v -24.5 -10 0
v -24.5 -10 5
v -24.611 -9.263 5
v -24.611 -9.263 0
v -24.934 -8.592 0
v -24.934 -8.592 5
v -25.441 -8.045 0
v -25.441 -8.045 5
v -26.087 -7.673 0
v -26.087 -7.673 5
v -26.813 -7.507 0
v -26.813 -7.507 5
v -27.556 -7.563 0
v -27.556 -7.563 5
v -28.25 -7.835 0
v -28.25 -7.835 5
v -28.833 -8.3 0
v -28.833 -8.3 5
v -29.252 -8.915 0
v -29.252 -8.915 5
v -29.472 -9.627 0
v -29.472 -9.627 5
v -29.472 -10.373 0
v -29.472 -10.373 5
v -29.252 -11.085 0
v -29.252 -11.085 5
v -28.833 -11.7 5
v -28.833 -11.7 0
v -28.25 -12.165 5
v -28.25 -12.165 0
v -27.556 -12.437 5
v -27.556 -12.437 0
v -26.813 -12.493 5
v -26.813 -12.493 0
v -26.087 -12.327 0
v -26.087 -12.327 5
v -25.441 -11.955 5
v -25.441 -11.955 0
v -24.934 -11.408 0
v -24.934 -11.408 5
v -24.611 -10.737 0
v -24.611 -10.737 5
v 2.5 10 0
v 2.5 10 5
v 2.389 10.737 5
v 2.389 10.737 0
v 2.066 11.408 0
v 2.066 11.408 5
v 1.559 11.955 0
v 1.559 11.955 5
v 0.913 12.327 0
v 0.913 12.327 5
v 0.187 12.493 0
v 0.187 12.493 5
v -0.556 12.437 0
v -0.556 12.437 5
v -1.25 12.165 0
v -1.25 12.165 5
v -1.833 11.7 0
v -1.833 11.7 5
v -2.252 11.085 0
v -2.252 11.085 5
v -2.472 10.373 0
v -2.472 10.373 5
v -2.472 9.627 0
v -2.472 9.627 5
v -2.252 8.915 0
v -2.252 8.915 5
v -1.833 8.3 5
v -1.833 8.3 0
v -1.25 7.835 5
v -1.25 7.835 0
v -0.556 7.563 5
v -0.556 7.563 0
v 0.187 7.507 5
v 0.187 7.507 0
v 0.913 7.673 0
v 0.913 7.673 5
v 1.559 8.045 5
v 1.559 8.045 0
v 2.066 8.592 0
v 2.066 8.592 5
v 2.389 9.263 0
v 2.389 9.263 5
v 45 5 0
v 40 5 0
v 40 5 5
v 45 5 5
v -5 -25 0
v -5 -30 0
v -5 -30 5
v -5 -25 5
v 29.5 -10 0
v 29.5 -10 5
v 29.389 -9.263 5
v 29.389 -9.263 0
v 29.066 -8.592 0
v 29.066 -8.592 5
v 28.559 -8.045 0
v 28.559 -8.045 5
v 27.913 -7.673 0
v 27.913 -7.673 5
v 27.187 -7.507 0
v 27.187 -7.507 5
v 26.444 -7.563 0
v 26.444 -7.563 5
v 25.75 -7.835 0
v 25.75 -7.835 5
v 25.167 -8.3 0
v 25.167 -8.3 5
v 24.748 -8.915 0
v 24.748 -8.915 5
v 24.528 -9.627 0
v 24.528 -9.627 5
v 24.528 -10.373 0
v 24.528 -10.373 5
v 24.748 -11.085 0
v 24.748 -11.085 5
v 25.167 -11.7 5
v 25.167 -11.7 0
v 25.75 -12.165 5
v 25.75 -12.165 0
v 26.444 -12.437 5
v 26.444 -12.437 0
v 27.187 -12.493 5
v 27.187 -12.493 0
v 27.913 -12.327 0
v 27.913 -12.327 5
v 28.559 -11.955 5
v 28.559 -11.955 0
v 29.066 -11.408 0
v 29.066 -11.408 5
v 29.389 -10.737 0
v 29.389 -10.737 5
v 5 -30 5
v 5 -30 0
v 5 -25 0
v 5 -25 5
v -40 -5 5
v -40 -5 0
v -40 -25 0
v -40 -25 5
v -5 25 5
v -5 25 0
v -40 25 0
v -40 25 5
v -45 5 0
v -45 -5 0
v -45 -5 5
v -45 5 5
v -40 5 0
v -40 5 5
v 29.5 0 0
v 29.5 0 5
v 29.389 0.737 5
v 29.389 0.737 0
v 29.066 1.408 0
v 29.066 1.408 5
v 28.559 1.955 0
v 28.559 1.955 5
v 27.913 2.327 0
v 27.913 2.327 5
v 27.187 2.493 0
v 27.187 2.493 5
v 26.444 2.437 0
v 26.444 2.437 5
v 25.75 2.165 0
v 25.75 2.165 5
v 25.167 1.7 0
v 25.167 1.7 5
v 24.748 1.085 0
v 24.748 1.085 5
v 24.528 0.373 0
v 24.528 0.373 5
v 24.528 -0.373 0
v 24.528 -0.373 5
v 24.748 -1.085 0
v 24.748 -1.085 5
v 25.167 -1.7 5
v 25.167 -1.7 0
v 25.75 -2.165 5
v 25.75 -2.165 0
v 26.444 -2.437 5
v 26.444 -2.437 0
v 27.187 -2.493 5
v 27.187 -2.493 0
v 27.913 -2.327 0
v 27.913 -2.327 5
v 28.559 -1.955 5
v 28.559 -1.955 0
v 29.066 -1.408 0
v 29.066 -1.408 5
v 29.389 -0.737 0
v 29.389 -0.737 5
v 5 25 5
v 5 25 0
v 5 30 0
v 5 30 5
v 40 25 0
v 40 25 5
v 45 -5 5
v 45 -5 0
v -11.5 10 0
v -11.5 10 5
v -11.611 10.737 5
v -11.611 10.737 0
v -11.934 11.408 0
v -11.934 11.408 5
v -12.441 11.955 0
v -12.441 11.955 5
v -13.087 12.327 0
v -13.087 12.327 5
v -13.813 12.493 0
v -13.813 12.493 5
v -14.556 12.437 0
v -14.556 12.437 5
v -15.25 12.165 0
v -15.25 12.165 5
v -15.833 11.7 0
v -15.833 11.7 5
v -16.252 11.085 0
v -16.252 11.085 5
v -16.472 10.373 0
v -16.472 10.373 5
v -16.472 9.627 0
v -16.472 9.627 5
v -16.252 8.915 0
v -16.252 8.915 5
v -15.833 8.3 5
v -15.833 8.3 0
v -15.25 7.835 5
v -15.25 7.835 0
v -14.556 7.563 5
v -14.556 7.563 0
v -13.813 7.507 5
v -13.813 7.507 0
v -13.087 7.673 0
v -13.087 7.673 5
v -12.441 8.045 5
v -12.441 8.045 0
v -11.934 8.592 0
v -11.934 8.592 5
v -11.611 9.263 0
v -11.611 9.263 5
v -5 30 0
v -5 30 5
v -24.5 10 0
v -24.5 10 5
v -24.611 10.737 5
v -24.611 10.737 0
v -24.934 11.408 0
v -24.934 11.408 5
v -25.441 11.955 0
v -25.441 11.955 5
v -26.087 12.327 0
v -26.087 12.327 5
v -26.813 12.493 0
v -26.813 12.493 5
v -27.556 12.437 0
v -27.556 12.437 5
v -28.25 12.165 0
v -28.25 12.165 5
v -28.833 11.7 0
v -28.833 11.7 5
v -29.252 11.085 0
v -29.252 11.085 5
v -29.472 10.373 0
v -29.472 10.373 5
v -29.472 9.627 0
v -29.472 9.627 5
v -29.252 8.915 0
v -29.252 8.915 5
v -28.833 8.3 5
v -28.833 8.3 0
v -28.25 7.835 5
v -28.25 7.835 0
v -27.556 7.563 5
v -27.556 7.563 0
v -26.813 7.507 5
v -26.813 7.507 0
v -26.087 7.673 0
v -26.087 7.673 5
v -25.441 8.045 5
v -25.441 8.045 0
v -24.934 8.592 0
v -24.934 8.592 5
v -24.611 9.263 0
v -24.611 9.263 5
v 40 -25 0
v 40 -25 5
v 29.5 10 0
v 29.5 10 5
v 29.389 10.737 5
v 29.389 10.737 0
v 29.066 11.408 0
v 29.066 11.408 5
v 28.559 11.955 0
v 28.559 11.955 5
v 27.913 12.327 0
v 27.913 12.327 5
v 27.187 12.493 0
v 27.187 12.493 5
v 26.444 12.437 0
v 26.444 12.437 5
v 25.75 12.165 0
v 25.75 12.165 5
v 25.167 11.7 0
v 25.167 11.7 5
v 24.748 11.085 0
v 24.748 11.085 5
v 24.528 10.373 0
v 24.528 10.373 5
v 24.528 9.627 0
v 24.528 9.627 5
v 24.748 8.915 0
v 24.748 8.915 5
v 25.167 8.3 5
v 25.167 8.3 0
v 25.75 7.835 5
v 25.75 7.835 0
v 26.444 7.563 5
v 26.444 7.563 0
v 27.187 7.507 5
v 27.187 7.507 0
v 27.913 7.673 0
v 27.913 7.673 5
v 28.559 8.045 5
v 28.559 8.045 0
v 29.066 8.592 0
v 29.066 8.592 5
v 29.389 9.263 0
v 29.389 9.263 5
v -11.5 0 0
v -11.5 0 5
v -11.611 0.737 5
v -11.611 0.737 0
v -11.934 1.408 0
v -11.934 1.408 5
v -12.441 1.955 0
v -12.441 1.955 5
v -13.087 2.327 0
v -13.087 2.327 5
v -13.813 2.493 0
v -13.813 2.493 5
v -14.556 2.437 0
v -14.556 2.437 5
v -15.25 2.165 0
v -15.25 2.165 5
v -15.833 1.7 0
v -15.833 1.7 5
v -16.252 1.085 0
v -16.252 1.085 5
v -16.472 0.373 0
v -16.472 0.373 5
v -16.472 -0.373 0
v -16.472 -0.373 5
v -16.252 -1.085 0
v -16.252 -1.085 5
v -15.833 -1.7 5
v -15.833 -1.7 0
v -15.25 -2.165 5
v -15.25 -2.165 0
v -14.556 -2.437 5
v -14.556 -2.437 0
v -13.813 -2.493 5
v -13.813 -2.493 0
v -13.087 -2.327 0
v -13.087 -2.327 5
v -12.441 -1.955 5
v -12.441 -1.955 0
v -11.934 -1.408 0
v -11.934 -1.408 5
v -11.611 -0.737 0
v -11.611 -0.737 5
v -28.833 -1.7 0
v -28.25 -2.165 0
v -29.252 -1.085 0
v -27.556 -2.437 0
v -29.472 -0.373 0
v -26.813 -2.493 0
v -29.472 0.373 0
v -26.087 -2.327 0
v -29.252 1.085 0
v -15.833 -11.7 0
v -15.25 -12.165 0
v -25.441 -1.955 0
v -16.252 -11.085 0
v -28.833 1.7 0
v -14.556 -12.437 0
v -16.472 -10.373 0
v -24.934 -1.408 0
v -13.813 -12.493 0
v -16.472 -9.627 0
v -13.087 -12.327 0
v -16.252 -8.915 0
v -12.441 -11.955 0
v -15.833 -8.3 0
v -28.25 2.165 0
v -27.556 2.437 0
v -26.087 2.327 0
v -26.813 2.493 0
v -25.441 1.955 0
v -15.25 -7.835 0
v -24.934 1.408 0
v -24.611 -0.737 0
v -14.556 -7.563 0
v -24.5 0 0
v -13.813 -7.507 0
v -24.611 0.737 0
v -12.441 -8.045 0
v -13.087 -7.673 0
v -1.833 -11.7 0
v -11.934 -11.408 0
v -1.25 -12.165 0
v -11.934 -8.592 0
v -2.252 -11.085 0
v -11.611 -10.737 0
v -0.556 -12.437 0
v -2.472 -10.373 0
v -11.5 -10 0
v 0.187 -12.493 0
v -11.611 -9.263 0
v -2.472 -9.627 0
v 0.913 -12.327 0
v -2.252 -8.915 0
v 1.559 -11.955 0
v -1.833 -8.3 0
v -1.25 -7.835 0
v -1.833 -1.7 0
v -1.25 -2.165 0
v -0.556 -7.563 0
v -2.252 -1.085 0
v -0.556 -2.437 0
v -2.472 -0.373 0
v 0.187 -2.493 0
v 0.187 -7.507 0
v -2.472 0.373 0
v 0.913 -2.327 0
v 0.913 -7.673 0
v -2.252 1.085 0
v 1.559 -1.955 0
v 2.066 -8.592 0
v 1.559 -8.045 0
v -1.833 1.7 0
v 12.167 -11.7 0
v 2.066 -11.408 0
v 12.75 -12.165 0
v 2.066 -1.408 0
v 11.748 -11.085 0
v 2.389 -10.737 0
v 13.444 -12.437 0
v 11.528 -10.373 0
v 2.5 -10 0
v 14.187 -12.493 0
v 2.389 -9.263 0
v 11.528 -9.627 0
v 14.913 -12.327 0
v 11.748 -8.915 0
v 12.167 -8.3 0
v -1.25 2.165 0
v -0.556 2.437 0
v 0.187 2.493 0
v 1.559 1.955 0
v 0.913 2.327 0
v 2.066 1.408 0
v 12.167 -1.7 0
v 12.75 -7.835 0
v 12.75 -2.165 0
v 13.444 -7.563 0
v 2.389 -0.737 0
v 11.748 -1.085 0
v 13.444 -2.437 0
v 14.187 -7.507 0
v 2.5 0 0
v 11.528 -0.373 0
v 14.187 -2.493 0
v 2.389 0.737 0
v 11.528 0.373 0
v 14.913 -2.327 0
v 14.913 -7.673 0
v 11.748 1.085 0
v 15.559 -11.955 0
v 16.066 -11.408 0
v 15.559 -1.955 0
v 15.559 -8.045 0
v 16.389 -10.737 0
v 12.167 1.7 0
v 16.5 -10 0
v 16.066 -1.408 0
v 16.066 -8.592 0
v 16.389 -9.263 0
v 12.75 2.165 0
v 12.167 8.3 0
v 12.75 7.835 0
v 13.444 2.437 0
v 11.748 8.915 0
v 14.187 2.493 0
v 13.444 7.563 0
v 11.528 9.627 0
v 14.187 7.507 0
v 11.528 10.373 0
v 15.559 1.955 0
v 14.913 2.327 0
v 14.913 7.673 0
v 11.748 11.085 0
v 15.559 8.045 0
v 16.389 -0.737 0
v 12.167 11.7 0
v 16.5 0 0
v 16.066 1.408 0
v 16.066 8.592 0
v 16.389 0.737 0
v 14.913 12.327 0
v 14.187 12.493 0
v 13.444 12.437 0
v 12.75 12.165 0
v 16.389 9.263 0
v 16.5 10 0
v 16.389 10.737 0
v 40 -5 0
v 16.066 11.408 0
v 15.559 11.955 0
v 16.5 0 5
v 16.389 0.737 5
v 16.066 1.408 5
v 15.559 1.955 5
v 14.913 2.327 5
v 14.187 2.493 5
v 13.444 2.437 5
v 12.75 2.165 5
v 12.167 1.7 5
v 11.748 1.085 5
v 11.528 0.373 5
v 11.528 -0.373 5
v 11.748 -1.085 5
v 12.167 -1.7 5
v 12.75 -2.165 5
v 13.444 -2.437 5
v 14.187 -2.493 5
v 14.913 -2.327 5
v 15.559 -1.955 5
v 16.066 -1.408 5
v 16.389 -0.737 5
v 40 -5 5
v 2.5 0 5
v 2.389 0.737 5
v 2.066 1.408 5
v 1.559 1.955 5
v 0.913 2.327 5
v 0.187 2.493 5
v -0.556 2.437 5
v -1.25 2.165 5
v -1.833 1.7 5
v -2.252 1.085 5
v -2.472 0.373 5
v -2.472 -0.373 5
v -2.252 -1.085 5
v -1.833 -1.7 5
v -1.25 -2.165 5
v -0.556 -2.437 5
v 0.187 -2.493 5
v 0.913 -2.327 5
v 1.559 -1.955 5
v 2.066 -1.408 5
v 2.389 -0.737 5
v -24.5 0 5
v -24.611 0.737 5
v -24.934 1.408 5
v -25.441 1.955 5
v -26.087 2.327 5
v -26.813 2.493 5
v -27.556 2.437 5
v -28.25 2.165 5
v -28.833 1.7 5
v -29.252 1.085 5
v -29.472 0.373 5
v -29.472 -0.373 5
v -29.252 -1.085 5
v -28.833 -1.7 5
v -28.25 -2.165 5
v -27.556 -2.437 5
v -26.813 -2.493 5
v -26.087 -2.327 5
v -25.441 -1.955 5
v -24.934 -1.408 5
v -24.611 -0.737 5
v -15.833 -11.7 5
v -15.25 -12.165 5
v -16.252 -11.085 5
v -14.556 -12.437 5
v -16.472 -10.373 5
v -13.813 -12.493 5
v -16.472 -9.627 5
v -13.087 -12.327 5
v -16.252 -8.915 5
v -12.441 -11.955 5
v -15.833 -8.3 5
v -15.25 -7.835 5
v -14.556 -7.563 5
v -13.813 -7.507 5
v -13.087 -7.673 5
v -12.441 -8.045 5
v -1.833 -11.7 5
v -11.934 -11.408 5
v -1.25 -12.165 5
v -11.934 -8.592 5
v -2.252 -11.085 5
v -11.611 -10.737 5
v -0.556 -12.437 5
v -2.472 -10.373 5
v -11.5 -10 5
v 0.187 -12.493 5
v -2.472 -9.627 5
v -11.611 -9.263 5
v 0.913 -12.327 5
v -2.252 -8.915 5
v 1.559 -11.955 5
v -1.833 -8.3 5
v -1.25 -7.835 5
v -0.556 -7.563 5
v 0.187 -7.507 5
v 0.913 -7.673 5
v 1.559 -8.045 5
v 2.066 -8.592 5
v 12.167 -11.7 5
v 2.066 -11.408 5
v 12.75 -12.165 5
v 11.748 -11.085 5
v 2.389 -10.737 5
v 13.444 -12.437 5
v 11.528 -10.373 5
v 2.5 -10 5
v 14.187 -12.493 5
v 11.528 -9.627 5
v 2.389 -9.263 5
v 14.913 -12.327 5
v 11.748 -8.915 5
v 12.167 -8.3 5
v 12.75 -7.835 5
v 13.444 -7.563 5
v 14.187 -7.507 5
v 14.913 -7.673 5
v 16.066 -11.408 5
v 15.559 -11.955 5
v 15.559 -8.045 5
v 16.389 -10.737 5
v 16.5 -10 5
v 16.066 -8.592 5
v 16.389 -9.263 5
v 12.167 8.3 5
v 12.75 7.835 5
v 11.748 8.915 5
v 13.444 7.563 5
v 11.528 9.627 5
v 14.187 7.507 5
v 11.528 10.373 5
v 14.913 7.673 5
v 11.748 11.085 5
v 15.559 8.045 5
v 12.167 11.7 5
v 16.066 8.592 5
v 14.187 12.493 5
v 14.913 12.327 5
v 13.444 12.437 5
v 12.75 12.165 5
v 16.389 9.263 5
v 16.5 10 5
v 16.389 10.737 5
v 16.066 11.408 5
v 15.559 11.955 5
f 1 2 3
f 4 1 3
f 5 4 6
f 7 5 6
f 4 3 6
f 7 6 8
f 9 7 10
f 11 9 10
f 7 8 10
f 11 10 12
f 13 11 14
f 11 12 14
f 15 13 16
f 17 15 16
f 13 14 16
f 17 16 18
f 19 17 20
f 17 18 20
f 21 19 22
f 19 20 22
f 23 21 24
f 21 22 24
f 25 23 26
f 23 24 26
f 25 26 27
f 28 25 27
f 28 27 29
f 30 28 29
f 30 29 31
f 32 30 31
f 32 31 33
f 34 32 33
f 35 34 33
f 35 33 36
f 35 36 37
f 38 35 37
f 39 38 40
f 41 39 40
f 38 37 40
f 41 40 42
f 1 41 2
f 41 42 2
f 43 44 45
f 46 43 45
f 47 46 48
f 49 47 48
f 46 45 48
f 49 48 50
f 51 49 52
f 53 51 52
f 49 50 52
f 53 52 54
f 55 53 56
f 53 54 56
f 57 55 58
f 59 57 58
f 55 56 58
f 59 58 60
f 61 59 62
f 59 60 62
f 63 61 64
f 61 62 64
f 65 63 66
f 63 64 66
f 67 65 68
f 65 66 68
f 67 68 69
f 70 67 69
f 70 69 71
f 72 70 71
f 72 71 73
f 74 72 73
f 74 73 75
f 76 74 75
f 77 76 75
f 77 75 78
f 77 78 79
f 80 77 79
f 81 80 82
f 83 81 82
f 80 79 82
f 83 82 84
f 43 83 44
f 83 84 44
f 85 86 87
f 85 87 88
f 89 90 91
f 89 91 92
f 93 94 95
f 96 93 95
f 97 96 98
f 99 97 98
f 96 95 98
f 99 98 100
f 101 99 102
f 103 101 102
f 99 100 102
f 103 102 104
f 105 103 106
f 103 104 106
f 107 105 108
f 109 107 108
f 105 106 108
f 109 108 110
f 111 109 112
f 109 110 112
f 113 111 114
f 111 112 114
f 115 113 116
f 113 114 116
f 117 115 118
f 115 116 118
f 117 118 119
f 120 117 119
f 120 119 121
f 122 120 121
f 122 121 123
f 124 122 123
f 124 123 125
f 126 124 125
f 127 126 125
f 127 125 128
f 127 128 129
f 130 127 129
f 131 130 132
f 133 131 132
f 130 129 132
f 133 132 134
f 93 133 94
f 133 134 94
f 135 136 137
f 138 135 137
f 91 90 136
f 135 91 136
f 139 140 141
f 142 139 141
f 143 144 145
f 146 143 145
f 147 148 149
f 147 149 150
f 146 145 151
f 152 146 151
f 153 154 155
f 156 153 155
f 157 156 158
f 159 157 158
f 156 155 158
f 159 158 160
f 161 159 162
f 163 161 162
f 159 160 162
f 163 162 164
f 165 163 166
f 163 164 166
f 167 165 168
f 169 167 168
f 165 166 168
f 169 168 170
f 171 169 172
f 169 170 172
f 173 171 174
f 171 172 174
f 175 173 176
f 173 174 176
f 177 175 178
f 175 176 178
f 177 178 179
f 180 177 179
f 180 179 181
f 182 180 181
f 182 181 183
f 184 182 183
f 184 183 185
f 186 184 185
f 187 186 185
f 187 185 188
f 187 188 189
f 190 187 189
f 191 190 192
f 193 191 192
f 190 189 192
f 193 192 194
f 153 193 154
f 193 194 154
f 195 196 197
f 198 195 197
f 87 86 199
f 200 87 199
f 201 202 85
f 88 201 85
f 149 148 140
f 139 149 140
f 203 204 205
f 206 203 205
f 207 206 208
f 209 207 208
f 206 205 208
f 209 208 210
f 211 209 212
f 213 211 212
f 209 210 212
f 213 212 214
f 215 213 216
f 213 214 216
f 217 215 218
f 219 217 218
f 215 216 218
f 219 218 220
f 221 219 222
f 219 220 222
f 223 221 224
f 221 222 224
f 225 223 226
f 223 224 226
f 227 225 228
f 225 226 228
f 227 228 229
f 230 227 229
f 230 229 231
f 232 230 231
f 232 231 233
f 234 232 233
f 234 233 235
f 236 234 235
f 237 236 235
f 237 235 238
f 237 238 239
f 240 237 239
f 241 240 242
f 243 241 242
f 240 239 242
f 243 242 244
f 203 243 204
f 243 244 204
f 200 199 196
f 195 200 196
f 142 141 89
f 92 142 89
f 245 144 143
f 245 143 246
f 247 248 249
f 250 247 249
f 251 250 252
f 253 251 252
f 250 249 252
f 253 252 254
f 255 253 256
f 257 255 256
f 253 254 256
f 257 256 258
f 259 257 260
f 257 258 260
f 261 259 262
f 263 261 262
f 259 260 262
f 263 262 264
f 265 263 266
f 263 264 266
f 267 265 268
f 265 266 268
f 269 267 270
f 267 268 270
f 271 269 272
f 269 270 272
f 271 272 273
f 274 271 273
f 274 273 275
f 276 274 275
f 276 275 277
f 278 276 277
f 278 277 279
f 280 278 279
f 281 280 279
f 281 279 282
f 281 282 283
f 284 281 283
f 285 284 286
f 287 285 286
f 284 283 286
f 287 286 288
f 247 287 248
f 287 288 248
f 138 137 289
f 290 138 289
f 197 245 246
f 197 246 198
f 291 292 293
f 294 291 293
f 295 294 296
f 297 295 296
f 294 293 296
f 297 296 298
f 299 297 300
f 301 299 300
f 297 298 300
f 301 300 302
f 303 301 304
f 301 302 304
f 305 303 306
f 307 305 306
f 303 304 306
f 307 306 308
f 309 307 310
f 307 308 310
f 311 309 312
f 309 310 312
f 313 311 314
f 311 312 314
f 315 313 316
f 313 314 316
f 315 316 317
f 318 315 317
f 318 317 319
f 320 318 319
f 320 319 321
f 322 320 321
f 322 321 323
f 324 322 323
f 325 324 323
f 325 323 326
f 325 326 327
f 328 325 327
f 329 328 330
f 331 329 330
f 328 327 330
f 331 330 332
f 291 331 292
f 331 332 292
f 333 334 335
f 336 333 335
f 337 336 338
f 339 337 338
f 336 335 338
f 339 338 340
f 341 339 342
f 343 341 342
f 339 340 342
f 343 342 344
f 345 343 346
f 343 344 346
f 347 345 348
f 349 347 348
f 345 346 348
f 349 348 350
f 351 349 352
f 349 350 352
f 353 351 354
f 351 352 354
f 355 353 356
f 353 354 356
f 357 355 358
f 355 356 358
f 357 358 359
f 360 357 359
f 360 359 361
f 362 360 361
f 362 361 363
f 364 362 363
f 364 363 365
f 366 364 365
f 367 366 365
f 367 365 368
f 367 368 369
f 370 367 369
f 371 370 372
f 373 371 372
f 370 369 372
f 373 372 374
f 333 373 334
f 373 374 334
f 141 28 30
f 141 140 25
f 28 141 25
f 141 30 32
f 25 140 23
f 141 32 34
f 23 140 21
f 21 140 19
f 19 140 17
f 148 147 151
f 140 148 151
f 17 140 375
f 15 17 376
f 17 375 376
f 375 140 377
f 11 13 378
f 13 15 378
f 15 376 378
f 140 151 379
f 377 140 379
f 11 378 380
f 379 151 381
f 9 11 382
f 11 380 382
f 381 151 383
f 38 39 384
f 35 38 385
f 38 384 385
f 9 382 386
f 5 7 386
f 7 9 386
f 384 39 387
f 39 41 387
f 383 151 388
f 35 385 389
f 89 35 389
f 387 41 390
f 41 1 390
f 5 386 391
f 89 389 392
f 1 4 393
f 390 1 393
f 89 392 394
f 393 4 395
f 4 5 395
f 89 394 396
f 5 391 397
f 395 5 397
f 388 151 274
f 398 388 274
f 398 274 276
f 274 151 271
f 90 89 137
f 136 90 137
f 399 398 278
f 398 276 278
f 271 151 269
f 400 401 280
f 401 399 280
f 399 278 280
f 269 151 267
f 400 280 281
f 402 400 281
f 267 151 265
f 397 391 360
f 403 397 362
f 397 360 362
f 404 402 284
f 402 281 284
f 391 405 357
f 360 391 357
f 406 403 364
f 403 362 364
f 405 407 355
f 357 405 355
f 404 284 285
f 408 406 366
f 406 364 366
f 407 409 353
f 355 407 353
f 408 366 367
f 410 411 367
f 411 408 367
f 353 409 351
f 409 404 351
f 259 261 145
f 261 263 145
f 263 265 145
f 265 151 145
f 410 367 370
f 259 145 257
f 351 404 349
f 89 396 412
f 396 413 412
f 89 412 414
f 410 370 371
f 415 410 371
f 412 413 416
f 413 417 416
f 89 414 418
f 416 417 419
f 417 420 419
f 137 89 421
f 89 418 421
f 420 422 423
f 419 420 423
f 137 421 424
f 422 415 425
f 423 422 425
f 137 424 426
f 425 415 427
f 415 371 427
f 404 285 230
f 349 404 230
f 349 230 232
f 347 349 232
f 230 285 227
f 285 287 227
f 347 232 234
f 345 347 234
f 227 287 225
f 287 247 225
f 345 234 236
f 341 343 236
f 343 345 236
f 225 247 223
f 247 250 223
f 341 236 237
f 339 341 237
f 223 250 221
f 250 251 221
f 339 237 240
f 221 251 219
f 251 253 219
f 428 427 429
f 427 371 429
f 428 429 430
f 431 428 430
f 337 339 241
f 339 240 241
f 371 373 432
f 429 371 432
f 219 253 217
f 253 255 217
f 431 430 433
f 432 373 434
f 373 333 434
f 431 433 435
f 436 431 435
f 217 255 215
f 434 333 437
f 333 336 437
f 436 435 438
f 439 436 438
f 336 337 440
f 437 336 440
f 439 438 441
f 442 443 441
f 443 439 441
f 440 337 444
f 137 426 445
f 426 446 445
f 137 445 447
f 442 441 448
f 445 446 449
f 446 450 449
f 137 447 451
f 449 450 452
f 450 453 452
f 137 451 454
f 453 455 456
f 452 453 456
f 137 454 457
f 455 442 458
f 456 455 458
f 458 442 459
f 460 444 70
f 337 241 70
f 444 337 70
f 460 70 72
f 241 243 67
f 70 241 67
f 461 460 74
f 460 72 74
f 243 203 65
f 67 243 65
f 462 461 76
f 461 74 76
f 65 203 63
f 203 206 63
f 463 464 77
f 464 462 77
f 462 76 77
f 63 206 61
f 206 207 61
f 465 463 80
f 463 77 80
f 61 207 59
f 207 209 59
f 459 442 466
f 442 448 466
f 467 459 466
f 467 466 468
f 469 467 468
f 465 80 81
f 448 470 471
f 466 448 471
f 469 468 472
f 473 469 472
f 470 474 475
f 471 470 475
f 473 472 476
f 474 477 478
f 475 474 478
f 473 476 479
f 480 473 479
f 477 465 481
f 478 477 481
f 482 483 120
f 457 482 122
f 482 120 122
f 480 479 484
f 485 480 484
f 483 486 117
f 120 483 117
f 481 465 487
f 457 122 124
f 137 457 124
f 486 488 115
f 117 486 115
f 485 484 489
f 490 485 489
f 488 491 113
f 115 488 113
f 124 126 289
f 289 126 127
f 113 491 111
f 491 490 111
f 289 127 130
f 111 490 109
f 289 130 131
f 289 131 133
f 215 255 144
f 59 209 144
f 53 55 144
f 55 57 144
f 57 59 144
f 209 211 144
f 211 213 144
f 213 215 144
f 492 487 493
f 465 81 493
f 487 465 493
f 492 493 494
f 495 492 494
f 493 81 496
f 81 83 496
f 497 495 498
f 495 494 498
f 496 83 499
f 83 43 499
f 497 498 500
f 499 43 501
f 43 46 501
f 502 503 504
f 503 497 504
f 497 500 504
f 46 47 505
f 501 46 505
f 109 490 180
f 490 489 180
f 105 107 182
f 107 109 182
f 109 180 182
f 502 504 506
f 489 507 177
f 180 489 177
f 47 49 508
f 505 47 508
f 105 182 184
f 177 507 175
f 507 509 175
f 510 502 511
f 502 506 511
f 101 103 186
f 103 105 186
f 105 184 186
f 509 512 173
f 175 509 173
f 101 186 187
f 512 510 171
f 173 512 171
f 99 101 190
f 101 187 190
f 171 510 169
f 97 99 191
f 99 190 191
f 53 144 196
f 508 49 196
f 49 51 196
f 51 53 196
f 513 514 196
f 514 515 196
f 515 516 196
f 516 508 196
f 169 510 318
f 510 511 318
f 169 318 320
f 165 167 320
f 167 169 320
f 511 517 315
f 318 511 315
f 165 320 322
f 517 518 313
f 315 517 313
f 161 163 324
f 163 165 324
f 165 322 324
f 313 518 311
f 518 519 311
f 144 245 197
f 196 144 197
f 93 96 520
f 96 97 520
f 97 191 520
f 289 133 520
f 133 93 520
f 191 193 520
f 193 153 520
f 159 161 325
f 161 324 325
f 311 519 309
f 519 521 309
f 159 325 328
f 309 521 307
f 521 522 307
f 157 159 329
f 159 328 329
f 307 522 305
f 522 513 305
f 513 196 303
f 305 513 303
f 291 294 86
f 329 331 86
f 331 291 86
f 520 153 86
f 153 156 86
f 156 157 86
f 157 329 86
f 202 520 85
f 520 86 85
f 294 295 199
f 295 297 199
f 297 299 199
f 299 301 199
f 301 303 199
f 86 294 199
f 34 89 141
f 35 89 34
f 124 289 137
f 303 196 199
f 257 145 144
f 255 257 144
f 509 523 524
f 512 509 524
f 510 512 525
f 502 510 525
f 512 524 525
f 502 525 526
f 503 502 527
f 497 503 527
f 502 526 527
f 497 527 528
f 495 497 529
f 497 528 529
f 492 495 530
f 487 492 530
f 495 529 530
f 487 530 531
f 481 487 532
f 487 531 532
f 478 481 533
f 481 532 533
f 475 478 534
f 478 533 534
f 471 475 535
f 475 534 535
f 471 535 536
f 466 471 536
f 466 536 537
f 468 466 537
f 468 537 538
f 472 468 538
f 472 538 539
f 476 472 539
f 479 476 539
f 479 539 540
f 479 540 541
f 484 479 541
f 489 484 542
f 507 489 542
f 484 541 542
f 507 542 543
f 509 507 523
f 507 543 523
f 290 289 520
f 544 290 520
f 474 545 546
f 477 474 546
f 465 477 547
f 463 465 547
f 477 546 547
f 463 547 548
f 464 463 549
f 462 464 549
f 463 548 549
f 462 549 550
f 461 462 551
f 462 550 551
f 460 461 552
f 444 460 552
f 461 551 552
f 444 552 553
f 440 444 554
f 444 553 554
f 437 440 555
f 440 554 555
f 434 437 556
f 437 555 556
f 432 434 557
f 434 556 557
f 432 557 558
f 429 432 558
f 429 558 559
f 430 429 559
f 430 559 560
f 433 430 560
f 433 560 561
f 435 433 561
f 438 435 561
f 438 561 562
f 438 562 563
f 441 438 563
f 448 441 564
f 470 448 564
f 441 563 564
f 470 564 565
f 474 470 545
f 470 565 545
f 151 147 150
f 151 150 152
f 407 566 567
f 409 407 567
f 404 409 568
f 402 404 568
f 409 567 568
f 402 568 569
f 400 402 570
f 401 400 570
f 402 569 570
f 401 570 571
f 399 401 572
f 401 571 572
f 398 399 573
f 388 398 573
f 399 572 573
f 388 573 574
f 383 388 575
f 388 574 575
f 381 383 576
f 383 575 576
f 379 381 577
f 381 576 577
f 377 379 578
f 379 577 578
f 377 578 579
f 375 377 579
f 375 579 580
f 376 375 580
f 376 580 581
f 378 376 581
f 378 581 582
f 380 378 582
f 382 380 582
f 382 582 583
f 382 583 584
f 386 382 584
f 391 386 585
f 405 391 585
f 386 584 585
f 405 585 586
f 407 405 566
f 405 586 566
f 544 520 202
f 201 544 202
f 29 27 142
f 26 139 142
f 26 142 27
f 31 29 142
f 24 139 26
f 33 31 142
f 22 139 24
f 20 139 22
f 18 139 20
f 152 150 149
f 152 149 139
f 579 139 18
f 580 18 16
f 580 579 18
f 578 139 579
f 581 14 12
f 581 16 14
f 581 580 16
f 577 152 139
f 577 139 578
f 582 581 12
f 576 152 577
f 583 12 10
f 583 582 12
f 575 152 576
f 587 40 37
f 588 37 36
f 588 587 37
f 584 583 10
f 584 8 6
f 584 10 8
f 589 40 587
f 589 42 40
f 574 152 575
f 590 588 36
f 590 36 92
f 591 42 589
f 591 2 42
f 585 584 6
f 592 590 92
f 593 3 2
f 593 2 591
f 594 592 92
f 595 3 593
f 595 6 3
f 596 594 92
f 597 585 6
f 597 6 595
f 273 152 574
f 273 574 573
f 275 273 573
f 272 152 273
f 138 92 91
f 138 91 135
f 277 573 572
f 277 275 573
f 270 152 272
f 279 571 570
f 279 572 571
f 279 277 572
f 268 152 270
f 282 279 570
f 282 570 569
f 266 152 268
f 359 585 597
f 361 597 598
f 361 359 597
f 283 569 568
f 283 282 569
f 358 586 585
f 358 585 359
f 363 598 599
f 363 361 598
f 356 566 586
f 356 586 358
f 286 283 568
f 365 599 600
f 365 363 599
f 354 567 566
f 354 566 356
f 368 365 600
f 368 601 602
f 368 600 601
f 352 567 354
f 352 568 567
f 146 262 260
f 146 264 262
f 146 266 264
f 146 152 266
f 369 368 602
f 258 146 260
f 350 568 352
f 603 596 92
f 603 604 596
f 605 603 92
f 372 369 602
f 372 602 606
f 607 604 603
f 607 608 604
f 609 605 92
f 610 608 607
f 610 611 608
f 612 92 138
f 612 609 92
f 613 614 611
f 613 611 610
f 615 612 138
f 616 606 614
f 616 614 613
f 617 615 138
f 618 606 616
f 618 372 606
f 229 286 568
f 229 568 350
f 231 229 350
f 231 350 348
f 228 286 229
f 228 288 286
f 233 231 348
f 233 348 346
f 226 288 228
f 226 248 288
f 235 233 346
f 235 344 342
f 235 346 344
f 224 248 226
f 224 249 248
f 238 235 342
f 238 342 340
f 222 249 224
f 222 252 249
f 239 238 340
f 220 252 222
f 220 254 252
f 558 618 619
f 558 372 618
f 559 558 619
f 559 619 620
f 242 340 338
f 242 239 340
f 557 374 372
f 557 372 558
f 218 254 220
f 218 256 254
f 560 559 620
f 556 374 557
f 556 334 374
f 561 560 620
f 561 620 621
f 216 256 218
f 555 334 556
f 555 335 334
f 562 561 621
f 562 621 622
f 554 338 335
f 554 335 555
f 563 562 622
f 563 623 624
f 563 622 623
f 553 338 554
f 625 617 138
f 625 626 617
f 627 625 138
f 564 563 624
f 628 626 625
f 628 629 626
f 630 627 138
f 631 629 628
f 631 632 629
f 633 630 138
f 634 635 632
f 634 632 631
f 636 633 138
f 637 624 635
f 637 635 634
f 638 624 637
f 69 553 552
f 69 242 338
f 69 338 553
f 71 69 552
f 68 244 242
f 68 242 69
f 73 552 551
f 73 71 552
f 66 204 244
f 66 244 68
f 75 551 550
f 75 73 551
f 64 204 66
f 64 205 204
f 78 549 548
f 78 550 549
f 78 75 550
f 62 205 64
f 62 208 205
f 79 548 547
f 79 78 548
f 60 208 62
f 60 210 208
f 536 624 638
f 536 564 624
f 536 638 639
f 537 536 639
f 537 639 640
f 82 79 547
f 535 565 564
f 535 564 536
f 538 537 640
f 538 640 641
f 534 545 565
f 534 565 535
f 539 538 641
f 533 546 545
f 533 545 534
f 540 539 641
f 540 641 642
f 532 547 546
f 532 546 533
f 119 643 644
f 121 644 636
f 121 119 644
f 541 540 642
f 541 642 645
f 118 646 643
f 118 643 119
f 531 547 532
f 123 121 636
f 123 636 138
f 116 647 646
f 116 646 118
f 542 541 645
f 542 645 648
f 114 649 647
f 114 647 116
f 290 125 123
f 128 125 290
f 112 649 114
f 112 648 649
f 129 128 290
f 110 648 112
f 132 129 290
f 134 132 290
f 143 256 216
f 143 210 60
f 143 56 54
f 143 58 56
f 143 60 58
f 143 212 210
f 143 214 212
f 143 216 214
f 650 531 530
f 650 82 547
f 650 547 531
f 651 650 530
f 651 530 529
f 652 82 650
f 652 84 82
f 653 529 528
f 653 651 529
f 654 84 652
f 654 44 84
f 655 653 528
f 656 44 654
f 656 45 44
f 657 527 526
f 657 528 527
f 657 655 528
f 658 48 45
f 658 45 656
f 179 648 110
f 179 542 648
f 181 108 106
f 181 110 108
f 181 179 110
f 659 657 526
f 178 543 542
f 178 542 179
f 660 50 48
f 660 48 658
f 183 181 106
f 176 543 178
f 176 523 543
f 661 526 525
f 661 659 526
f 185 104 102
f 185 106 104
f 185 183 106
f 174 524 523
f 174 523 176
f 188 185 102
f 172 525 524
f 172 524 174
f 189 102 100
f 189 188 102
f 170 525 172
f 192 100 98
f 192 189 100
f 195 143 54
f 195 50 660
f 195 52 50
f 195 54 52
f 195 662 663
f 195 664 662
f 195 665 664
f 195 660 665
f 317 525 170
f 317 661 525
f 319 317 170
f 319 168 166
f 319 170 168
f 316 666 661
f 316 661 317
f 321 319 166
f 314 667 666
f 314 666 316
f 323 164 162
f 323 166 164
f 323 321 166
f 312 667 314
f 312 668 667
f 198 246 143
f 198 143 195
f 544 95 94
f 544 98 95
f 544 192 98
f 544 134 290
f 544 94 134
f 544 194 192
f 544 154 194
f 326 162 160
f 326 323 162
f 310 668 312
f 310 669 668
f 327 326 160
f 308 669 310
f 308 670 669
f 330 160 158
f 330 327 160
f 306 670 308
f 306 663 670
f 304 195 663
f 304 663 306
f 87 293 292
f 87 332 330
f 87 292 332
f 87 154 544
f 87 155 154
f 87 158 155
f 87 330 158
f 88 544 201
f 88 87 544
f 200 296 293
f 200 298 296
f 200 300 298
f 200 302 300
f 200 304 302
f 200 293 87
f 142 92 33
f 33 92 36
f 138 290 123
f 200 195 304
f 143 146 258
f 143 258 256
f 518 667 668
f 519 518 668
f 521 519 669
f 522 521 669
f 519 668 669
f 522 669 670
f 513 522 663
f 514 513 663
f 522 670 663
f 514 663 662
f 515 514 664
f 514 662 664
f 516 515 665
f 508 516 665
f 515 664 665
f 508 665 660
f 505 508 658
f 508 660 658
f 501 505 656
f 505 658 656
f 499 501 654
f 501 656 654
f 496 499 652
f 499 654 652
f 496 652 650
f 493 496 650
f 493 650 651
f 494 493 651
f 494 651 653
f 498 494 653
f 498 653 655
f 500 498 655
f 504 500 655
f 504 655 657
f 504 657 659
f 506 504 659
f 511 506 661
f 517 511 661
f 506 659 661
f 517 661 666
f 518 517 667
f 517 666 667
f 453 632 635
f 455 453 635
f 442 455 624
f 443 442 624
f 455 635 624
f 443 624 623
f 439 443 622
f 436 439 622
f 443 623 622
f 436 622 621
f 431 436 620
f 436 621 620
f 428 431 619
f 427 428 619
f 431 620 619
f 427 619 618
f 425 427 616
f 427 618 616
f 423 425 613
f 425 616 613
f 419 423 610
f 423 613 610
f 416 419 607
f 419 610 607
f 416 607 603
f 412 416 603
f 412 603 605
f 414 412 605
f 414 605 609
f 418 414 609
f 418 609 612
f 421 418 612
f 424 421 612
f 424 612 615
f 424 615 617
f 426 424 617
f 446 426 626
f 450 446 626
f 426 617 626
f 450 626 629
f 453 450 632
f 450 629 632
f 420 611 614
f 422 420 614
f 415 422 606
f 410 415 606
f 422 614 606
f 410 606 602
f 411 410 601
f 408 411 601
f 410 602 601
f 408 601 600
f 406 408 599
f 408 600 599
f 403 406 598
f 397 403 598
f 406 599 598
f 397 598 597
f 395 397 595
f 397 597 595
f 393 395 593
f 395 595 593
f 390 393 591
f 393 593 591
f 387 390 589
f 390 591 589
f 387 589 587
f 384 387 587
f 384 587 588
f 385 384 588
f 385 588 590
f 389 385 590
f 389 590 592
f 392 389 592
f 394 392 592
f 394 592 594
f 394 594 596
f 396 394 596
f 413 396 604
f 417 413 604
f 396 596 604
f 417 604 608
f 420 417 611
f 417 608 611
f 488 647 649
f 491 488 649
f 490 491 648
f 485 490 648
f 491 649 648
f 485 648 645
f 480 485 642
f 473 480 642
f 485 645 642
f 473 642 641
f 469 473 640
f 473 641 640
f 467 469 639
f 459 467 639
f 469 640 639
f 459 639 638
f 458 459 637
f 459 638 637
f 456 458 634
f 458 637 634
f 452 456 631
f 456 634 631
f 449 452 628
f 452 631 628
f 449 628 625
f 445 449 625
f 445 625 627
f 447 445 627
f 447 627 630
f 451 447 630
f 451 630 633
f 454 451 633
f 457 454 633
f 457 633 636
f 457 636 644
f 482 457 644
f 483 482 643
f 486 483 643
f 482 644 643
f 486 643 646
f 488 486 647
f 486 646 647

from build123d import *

# Parameters (mm, degrees)
F0_W     = 10
F0_H     = 5
F0_W_2   = 5
F0_H_2   = 10
F1_DEPTH = 5
F2_R     = 2.5
F3_DEPTH = 5


with BuildPart() as f1:
    # F0 (on Top) → F1 (new body)
    with BuildSketch(Plane.XY):
        Polygon((-5, 25), (-40, 25), (-40, 5), (-40, -5), (-40, -25), (-5, -25), (5, -25), (40, -25), (40, -5), (40, 5), (40, 25), (5, 25), align=None)
        with Locations((0, 27.5)):
            Rectangle(F0_W, F0_H)
        with Locations((-42.5, 0)):
            Rectangle(F0_W_2, F0_H_2)
        with Locations((0, -27.5)):
            Rectangle(F0_W, F0_H)
        with Locations((42.5, 0)):
            Rectangle(F0_W_2, F0_H_2)
    extrude(amount=F1_DEPTH)

    # F2 (on face) → F3 (cut)
    with BuildSketch(Plane.XY.offset(5)):
        with Locations((-27, 10)):
            Circle(F2_R)
        with Locations((-14, 10)):
            Circle(F2_R)
        with Locations((0, 10)):
            Circle(F2_R)
        with Locations((14, 10)):
            Circle(F2_R)
        with Locations((27, 10)):
            Circle(F2_R)
        with Locations((-27, 0)):
            Circle(F2_R)
        with Locations((-14, 0)):
            Circle(F2_R)
        Circle(F2_R)
        with Locations((14, 0)):
            Circle(F2_R)
        with Locations((27, 0)):
            Circle(F2_R)
        with Locations((27, -10)):
            Circle(F2_R)
        with Locations((14, -10)):
            Circle(F2_R)
        with Locations((0, -10)):
            Circle(F2_R)
        with Locations((-14, -10)):
            Circle(F2_R)
        with Locations((-27, -10)):
            Circle(F2_R)
    extrude(amount=-F3_DEPTH, mode=Mode.SUBTRACT)


solid = f1.part
